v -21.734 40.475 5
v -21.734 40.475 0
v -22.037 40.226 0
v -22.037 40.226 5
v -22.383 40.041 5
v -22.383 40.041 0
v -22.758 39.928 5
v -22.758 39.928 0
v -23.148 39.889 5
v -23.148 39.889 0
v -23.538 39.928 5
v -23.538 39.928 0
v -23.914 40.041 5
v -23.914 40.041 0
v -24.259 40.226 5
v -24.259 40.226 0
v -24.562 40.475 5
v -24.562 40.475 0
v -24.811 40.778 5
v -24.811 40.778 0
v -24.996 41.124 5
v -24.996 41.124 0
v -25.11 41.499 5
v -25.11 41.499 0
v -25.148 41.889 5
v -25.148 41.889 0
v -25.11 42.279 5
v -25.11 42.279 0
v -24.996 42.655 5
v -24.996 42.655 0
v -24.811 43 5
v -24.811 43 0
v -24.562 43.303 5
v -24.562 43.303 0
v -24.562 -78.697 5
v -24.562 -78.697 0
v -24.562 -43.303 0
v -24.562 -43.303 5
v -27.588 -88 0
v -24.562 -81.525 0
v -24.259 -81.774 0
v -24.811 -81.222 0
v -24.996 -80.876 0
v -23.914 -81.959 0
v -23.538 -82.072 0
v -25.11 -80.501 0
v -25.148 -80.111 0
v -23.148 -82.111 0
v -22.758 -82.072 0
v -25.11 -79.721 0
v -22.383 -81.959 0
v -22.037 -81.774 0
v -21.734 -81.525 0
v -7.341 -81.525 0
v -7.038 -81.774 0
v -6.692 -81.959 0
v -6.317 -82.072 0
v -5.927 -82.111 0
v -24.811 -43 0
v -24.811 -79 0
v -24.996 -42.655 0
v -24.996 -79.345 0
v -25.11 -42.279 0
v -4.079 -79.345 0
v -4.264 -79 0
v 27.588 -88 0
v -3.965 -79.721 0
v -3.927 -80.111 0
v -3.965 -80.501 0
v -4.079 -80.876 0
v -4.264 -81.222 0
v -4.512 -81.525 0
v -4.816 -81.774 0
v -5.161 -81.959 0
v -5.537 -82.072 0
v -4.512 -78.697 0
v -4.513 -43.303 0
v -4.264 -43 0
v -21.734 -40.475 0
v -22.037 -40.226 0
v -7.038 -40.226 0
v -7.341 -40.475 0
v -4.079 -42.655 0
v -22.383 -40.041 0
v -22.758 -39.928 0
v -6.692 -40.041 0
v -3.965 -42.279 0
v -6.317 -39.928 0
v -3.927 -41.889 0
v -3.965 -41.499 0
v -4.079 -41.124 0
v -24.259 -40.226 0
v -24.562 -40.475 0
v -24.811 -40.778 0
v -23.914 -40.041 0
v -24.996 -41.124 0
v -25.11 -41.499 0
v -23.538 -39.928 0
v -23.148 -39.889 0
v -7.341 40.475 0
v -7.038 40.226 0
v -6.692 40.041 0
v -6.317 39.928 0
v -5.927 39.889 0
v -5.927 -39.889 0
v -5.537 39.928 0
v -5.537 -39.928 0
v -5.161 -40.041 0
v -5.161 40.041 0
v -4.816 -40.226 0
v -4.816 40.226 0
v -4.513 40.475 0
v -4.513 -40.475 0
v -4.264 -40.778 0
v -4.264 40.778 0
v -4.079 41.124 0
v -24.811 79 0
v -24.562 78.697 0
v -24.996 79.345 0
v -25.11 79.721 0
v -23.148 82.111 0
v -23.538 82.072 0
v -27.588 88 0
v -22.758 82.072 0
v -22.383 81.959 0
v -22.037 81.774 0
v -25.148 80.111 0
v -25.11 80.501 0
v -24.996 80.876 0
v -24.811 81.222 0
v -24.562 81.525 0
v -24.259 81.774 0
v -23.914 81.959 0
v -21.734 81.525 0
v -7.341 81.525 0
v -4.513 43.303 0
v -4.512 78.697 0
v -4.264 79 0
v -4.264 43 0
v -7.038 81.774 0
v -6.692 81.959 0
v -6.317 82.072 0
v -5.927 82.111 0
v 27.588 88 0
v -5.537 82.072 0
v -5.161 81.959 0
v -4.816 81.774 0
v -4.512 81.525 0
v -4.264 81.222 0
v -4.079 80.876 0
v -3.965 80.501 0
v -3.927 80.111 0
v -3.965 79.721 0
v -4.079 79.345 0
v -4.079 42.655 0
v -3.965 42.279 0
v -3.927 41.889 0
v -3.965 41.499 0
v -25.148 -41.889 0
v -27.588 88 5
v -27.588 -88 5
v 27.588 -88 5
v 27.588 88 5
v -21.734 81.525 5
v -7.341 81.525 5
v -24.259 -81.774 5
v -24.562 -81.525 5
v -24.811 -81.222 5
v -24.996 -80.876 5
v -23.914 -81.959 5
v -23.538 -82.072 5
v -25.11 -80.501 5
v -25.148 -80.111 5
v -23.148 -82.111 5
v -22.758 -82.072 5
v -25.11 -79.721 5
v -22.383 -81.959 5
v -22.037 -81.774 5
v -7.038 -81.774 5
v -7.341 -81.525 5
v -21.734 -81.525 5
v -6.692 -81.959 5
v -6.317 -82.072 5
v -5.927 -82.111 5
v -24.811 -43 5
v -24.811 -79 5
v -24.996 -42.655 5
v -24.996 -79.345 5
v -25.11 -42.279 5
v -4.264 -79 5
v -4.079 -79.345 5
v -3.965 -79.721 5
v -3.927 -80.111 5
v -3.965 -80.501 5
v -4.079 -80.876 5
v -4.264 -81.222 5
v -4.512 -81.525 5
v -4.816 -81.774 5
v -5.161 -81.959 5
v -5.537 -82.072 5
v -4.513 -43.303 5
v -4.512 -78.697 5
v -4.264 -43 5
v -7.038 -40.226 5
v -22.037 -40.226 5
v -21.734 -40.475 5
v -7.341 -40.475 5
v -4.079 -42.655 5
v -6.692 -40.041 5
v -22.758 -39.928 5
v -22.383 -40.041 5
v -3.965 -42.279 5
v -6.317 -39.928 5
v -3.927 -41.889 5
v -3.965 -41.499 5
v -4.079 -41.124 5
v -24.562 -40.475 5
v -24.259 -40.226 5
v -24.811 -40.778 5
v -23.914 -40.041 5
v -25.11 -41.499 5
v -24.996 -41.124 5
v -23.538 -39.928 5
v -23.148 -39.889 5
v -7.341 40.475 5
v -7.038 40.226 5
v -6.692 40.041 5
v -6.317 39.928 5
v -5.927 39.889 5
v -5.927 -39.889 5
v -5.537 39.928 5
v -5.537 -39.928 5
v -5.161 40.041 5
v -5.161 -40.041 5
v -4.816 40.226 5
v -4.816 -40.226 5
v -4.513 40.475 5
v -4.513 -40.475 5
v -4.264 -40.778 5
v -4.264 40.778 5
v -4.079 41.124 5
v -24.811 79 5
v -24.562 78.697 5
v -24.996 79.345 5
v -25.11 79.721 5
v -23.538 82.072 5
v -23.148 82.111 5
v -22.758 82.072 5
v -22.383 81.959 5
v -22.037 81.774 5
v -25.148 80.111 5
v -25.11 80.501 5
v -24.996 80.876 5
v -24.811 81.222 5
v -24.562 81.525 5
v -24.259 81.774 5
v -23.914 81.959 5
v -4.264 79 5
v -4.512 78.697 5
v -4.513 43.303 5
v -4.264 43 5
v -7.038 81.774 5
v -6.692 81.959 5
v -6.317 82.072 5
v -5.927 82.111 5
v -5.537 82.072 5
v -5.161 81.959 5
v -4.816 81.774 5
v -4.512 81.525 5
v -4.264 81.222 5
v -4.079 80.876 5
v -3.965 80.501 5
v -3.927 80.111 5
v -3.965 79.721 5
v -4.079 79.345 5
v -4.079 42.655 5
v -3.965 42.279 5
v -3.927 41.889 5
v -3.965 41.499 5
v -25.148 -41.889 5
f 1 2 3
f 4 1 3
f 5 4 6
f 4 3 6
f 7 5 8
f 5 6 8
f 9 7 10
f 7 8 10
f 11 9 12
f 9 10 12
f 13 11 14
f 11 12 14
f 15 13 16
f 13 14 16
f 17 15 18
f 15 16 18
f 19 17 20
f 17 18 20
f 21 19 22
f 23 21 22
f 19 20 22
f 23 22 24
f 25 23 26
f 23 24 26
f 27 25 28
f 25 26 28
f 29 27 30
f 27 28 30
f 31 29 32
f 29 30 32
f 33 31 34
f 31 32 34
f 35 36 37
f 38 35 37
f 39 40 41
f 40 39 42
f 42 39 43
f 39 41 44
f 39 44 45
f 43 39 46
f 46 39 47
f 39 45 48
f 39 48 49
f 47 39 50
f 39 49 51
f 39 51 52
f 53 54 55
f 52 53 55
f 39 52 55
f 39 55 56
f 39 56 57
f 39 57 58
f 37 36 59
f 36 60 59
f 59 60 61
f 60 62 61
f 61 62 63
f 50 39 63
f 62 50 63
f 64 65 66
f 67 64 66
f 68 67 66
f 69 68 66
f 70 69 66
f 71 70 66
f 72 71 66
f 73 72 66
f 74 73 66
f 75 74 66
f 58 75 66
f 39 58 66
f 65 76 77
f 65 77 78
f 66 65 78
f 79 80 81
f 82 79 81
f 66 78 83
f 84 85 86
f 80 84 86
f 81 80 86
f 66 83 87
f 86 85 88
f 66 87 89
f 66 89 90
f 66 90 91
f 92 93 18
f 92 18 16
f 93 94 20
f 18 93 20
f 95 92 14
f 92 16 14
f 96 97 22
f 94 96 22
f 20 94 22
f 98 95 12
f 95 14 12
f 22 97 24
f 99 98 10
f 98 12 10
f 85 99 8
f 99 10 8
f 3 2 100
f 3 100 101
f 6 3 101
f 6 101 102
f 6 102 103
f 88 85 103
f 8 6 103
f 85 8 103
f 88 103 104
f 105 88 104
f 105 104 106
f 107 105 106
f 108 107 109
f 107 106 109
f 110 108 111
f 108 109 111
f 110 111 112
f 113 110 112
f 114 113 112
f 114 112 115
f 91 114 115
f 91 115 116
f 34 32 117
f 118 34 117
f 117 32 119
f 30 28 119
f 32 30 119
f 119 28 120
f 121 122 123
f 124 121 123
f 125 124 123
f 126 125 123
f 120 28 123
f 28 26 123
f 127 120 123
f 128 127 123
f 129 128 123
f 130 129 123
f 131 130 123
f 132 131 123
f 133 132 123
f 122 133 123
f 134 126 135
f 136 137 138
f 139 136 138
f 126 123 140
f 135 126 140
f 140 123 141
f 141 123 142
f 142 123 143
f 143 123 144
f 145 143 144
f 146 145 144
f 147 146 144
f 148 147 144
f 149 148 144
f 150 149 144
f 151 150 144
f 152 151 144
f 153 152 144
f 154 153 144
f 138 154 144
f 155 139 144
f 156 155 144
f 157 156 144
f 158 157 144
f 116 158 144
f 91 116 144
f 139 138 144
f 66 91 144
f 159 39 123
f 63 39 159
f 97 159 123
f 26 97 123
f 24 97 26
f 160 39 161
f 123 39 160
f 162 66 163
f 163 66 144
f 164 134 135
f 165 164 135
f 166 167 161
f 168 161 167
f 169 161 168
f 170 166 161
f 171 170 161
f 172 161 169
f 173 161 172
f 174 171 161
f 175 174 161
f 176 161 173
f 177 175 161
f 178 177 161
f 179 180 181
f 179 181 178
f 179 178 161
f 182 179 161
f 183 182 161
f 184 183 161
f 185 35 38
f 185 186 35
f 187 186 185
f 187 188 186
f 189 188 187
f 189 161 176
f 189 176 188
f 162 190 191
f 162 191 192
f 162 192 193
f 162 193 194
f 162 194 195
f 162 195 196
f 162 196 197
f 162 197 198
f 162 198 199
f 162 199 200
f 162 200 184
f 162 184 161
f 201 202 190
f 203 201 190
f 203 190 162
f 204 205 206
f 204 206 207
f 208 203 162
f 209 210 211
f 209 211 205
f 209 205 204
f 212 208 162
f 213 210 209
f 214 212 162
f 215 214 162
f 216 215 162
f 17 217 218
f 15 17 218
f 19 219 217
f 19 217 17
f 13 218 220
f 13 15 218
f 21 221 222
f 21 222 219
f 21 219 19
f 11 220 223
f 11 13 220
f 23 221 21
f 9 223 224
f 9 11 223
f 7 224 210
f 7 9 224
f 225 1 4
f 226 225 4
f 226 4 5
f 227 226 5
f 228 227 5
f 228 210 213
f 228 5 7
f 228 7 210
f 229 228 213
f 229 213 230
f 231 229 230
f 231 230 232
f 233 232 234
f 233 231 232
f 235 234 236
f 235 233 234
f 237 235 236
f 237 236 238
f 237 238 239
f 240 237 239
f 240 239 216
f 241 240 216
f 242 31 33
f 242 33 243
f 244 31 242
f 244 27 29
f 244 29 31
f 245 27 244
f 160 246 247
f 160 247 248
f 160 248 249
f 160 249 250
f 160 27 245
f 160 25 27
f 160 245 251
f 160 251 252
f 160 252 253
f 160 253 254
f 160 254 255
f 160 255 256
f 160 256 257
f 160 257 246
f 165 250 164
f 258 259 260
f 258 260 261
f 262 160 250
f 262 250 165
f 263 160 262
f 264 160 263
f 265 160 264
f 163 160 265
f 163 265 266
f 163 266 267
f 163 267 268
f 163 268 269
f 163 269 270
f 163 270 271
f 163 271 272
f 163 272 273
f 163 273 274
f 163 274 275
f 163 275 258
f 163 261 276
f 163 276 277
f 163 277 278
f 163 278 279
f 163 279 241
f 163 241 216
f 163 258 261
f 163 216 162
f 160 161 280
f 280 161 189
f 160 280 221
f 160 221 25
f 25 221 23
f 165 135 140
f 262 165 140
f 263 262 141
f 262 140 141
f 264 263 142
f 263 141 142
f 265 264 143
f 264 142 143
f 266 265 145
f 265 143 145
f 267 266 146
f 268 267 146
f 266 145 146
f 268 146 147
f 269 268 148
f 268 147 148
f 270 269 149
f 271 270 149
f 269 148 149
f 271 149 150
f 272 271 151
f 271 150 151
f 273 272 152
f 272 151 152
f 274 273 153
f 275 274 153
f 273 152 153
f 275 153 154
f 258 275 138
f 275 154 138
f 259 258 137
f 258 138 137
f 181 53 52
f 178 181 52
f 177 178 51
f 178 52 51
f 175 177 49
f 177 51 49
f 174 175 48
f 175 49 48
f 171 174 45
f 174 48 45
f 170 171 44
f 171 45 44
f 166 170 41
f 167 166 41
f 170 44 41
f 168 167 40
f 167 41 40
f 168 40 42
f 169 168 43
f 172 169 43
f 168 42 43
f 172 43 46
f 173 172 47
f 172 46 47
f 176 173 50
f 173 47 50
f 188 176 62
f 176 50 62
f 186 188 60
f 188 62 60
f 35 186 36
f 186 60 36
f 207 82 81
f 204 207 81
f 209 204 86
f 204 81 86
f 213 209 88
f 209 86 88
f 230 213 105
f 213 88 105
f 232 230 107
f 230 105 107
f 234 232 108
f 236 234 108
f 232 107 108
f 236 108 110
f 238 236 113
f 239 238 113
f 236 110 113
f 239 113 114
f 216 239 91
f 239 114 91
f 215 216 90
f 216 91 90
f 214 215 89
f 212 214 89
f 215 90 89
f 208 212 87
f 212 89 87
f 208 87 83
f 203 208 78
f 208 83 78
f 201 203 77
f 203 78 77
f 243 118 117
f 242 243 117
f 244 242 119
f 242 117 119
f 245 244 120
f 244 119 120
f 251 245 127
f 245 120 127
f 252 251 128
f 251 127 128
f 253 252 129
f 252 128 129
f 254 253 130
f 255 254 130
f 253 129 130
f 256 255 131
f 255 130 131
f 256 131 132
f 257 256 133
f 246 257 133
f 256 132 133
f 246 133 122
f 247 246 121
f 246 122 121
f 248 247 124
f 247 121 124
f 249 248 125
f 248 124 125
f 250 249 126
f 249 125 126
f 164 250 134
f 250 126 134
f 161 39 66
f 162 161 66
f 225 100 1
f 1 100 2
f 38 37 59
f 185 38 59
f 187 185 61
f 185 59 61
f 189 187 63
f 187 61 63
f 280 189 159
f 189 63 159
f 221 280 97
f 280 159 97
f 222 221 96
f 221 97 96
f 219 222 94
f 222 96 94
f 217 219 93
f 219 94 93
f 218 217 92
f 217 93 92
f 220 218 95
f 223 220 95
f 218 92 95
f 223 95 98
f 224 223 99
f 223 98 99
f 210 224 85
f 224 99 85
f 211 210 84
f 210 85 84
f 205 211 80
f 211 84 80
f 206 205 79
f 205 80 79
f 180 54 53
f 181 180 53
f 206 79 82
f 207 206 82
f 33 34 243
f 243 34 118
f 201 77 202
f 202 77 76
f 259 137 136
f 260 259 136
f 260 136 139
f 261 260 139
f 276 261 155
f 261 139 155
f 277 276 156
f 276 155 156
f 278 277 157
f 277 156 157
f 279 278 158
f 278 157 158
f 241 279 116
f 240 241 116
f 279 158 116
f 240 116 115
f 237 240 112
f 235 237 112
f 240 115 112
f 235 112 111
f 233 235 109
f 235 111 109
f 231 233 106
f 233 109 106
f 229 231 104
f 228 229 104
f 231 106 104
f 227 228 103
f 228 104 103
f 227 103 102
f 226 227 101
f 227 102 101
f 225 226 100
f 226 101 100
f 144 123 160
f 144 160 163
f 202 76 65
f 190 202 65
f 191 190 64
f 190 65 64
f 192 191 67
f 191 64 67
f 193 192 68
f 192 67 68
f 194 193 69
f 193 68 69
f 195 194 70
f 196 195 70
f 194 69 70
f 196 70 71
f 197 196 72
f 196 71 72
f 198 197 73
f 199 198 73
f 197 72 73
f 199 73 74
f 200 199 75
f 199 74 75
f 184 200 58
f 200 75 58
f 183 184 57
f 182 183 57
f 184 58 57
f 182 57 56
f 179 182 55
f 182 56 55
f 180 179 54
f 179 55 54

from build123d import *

# Parameters (mm, degrees)
F0_W     = 55.175
F0_H     = 176
F1_DEPTH = 5


with BuildPart() as f1:
    # F0 (on Top) → F1 (new body)
    with BuildSketch(Plane.XY):
        Rectangle(F0_W, F0_H)
        with BuildLine():
            ThreePointArc((-24.5625, -43.303427), (-24.5625, -40.475), (-21.734073, -40.475))
            Line((-21.734073, -40.475), (-7.340927, -40.475))
            ThreePointArc((-7.340927, -40.475), (-4.5125, -40.475), (-4.5125, -43.303427))
            Line((-4.5125, -43.303427), (-4.5125, -55.775))
            Line((-4.5125, -55.775), (-4.5125, -78.696573))
            ThreePointArc((-4.5125, -78.696573), (-4.5125, -81.525), (-7.340927, -81.525))
            Line((-7.340927, -81.525), (-21.734073, -81.525))
            ThreePointArc((-21.734073, -81.525), (-24.5625, -81.525), (-24.5625, -78.696573))
            Line((-24.5625, -78.696573), (-24.5625, -55.775))
            Line((-24.5625, -55.775), (-24.5625, -43.303427))
        make_face(mode=Mode.SUBTRACT)
        with BuildLine():
            Line((-24.5625, 43.303427), (-24.5625, 55.775))
            Line((-24.5625, 55.775), (-24.5625, 78.696573))
            ThreePointArc((-24.5625, 78.696573), (-24.5625, 81.525), (-21.734073, 81.525))
            Line((-21.734073, 81.525), (-7.340927, 81.525))
            ThreePointArc((-7.340927, 81.525), (-4.5125, 81.525), (-4.5125, 78.696573))
            Line((-4.5125, 78.696573), (-4.5125, 55.775))
            Line((-4.5125, 55.775), (-4.5125, 43.303427))
            ThreePointArc((-4.5125, 43.303427), (-4.5125, 40.475), (-7.340927, 40.475))
            Line((-7.340927, 40.475), (-21.734073, 40.475))
            ThreePointArc((-21.734073, 40.475), (-24.5625, 40.475), (-24.5625, 43.303427))
        make_face(mode=Mode.SUBTRACT)
    extrude(amount=F1_DEPTH)


solid = f1.part
